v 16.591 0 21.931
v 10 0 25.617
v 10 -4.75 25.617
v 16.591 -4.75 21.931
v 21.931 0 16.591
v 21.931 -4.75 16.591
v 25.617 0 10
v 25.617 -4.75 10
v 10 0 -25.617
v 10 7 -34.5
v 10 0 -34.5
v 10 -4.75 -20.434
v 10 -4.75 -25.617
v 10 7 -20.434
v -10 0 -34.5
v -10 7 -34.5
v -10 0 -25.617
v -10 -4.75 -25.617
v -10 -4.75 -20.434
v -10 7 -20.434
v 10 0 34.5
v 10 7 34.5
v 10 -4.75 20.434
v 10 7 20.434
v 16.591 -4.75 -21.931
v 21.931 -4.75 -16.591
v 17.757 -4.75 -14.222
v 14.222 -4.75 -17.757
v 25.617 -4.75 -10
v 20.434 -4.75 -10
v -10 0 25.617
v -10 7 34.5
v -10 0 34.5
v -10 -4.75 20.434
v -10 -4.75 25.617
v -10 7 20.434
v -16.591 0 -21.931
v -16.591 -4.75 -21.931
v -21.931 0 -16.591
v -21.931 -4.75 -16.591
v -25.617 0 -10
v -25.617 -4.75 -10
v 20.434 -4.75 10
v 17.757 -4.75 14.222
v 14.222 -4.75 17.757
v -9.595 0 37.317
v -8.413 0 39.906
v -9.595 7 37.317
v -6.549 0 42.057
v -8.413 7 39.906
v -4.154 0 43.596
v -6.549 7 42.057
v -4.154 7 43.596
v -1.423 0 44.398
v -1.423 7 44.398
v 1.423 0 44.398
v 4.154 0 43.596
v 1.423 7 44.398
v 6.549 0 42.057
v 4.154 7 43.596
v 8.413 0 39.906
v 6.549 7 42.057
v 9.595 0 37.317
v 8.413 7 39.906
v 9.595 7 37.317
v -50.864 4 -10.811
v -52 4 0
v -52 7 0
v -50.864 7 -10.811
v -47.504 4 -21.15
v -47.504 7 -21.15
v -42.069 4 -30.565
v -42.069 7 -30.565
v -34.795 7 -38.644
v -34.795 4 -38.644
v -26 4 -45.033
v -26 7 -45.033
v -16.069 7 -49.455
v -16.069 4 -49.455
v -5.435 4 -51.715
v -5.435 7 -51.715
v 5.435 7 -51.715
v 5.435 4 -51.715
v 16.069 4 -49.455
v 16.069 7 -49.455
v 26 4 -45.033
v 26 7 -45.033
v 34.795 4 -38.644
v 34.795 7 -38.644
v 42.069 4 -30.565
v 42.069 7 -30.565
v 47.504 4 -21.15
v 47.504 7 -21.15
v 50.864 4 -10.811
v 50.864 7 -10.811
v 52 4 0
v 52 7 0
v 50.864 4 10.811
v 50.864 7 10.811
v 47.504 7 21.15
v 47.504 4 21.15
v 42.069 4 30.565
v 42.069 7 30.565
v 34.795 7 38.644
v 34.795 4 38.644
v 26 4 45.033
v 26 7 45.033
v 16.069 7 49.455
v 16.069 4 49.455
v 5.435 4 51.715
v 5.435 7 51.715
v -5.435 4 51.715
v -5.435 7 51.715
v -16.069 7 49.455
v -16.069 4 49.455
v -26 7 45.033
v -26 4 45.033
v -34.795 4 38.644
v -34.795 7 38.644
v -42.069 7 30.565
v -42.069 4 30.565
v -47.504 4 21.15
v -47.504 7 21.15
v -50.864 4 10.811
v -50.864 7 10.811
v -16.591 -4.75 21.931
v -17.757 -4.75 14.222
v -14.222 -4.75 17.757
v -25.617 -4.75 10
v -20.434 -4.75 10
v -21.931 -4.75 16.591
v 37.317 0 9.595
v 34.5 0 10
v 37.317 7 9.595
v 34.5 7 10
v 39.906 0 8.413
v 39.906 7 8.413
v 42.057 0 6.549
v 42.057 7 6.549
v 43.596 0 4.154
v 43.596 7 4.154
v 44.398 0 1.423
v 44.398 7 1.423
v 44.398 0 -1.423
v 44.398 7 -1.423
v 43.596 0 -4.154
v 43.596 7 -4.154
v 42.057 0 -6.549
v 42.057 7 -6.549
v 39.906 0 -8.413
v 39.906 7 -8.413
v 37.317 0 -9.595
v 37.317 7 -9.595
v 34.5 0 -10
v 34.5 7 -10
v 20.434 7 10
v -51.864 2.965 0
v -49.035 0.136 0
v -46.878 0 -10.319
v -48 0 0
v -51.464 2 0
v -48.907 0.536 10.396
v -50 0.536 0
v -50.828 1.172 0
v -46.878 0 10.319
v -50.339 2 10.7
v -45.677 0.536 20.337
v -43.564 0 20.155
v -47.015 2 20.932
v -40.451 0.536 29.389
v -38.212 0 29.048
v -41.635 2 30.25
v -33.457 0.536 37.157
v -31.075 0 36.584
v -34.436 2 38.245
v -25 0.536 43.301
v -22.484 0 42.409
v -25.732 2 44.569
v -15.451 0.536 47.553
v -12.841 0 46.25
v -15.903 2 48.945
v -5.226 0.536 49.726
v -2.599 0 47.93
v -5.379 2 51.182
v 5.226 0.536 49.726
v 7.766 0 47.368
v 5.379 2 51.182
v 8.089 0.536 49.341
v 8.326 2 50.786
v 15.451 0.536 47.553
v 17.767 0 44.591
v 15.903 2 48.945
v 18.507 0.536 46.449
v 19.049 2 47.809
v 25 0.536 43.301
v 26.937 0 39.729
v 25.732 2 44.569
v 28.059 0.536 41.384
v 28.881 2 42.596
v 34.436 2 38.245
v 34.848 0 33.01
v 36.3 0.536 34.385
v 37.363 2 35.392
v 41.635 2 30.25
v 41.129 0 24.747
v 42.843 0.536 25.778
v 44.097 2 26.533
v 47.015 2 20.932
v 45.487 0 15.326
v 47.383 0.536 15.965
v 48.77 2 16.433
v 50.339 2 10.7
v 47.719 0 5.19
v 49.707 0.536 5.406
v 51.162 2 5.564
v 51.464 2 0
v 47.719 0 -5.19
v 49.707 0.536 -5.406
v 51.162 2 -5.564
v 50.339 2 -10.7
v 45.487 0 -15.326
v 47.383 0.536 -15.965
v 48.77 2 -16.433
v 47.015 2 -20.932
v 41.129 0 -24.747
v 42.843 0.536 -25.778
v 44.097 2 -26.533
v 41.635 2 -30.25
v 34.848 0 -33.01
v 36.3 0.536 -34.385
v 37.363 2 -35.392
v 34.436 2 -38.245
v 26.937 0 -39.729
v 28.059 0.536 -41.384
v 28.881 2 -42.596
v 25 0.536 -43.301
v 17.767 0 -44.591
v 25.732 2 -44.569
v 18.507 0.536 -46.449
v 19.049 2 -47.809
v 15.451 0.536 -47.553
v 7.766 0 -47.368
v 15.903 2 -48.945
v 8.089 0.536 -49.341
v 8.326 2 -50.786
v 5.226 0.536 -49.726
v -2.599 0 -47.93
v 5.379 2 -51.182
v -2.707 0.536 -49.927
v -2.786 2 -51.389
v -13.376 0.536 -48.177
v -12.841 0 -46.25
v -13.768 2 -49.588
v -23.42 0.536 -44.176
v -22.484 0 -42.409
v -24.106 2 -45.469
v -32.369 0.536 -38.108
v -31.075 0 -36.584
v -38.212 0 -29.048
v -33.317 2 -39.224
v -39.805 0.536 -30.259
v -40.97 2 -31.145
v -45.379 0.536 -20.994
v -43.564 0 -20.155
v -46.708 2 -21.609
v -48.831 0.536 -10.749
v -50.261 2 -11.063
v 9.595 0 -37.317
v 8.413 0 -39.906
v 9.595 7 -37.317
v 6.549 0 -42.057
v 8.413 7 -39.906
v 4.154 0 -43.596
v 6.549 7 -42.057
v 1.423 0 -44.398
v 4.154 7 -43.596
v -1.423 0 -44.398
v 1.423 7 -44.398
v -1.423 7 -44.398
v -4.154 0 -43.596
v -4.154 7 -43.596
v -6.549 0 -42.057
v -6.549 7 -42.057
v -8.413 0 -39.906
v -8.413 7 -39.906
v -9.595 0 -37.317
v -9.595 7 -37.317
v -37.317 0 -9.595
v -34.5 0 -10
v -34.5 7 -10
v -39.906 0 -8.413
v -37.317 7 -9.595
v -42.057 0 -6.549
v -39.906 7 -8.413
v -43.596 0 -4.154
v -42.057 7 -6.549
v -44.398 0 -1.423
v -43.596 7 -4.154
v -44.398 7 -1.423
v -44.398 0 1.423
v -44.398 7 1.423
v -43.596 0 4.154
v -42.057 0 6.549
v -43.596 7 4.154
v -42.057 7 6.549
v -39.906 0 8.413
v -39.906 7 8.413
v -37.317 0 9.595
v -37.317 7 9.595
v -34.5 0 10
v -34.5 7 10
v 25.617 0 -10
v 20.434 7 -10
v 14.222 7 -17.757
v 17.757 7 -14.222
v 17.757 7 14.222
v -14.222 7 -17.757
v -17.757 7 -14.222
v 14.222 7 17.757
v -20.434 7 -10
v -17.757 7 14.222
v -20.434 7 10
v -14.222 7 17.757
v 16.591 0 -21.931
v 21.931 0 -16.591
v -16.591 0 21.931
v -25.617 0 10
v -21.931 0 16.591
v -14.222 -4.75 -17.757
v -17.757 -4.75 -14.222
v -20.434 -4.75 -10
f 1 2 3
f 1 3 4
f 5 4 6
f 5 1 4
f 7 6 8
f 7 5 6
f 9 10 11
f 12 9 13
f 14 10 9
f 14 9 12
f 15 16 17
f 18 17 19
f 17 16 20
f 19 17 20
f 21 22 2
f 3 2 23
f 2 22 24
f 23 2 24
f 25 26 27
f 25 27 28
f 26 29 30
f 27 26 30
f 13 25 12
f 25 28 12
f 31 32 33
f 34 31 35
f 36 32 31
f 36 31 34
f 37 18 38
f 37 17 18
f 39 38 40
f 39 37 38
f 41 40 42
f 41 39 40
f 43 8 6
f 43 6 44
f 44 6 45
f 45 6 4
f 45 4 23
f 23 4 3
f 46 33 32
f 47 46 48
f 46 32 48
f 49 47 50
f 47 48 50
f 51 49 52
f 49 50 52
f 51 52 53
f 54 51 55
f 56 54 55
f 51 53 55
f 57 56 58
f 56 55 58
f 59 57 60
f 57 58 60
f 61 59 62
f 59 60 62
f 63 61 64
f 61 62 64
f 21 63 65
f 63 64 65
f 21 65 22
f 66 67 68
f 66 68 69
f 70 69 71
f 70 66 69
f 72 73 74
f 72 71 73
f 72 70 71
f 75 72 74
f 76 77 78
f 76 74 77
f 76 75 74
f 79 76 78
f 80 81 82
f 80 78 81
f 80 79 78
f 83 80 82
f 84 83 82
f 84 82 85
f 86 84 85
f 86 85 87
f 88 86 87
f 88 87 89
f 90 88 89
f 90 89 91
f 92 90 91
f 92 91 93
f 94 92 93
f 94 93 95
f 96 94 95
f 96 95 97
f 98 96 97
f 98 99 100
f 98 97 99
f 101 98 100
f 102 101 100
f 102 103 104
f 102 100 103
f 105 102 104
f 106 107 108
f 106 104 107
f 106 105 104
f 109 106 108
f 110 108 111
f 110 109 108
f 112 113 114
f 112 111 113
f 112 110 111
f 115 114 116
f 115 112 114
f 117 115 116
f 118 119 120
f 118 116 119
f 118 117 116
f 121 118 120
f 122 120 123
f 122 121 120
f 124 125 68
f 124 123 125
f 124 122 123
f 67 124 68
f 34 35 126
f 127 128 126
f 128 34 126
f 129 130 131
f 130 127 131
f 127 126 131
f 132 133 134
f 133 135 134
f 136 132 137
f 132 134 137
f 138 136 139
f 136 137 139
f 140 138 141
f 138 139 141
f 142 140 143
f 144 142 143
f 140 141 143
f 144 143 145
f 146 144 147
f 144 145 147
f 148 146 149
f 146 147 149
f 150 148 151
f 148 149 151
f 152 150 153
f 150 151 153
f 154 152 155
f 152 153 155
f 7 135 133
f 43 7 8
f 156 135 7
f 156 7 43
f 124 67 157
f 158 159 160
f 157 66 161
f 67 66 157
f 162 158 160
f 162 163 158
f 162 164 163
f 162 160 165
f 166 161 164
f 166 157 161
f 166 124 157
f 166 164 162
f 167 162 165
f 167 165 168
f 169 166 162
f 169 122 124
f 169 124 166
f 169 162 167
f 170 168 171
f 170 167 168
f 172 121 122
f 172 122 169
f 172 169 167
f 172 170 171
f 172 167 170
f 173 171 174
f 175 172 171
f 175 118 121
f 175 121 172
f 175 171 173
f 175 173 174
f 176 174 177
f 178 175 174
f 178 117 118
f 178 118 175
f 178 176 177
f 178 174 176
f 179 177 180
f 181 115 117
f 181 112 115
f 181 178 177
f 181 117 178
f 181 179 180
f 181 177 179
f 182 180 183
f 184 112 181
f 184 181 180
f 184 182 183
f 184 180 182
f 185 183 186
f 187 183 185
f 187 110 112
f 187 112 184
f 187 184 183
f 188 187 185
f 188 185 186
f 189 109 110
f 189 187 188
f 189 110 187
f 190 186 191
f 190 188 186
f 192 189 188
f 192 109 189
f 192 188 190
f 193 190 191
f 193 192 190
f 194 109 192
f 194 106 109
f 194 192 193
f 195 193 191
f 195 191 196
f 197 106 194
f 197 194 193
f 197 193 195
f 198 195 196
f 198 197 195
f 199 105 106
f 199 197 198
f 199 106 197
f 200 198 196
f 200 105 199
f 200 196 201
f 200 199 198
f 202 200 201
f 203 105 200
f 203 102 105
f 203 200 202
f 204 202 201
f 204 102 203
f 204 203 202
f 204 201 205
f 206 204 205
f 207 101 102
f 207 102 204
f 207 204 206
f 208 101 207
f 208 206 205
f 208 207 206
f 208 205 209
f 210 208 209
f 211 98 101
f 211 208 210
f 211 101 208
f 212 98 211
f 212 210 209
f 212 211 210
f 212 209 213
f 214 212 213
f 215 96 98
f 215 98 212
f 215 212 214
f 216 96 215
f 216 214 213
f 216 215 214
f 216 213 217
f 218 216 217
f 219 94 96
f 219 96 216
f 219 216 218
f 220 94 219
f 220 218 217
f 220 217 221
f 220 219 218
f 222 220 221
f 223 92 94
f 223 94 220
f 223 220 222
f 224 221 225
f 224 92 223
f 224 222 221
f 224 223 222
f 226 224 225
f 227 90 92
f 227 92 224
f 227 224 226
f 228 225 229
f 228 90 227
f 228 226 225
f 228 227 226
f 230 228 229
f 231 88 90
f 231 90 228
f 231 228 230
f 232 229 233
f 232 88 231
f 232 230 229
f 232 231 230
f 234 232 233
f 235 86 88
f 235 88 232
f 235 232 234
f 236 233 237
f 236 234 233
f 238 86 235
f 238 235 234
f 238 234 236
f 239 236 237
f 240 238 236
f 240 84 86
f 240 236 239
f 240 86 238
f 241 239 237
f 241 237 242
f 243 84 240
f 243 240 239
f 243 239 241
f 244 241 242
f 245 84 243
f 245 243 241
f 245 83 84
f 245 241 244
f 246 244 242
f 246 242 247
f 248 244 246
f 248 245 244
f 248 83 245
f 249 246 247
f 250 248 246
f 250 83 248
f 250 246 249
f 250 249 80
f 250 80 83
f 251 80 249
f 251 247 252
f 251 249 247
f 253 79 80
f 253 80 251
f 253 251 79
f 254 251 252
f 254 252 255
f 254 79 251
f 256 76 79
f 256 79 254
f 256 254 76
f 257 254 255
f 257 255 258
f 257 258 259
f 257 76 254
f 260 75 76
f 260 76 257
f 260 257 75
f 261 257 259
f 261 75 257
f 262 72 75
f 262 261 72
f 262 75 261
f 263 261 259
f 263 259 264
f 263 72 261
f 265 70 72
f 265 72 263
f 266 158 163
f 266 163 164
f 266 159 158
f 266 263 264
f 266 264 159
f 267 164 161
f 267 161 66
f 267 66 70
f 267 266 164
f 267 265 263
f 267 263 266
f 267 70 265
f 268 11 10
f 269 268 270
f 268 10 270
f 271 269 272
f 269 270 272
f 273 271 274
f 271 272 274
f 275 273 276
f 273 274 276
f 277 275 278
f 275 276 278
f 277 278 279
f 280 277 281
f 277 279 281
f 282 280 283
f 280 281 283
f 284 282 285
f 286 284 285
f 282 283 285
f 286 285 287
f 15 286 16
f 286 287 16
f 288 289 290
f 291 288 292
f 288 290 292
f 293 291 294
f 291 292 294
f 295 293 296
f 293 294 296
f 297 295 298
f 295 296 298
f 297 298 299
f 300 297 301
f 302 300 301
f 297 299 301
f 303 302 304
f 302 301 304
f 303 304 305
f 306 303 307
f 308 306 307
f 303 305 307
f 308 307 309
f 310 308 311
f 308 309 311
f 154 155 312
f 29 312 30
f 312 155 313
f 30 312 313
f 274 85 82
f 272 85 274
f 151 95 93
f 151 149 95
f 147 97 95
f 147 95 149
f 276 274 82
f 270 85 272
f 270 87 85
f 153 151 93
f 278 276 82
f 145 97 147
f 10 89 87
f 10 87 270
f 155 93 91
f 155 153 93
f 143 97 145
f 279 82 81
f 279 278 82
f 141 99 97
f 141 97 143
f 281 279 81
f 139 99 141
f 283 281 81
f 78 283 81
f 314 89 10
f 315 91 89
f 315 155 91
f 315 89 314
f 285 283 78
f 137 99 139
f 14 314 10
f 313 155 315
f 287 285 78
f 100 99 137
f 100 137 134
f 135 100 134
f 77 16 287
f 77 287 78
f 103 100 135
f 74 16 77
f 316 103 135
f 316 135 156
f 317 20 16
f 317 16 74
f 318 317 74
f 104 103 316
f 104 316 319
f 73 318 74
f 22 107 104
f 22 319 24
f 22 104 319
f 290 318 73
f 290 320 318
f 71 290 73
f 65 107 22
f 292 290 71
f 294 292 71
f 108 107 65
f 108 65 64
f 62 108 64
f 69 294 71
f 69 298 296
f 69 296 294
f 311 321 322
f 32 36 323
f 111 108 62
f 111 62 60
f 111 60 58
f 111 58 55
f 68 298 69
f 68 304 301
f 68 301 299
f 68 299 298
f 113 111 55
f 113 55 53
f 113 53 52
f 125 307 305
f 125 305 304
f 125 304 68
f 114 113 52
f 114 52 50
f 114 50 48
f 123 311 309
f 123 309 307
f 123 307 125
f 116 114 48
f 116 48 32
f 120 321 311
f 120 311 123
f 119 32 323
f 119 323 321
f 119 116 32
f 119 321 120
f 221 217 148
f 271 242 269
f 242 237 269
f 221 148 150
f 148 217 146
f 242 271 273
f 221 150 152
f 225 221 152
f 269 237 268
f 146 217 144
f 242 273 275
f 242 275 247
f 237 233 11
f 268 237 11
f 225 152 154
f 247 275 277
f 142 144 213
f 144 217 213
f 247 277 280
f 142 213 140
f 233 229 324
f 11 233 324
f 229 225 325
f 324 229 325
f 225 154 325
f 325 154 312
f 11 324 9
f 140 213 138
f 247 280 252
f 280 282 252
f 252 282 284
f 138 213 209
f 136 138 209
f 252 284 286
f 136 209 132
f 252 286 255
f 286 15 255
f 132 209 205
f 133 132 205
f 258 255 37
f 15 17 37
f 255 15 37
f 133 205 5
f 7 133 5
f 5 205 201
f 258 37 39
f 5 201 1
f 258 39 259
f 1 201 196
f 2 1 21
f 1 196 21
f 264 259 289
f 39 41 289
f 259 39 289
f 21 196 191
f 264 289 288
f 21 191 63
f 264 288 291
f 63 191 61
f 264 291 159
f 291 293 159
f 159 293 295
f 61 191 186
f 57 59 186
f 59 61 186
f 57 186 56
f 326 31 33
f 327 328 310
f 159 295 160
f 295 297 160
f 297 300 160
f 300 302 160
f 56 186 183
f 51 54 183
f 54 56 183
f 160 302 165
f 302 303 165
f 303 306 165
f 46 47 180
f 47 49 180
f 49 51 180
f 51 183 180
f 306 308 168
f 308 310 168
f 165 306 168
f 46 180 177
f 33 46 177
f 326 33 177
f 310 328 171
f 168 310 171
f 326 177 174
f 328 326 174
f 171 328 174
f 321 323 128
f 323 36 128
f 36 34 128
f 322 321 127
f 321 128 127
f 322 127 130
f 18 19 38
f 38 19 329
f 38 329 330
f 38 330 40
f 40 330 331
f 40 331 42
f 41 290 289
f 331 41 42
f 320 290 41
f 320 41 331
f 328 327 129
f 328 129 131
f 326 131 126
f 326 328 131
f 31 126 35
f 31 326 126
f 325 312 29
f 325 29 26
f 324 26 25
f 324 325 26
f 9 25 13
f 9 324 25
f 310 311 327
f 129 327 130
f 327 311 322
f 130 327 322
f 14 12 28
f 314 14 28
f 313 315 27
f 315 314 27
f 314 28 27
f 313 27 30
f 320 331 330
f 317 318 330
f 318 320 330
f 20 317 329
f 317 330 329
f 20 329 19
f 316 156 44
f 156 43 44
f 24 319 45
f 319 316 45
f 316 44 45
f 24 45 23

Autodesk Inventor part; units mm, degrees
ref_plane "YZ Plane" through (0, 0, 0) normal (1, 0, 0) x (0, 1, 0)
ref_plane "XZ Plane" through (0, 0, 0) normal (0, 1, 0) x (-1, 0, 0)
ref_plane "XY Plane" through (0, 0, 0) normal (0, 0, 1) x (1, 0, 0)
sketch "Sketch1" plane through (0, 0, 0) normal (0, 1, 0) x (-1, 0, 0)
  circle A0 centre (0, 0) radius 52
  circle A1 centre (0, 0) radius 22.75
  circle A2 centre (0, 0) radius 27.5
  dimension "d2" = 45.5
  dimension "d4" = 55
extrude "Extrusion1" add sketch "Sketch1" against normal blind 4.75 contours A2
extrude "Extrusion2" add sketch "Sketch1" along normal blind 7 contours A0 | A2
fillet "Fillet1" radius 4 1 edges at (52, 0, 0)
sketch "Sketch2" plane through (0, 7, 0) normal (0, 1, 0) x (1, 0, 0)
  circle A0 centre (34.5, 0) radius 10
  circle A1 centre (0, 34.5) radius 10
  circle A2 centre (-34.5, 0) radius 10
  circle A3 centre (0, -34.5) radius 10
  circle A4 centre (0, 0) radius 52
  line L0 (0, 0) -> (44.5, 0)
  circle A5 centre (0, 0) radius 44.5
  dimension "d14" = 360
extrude "Extrusion3" cut sketch "Sketch2" against normal through all contours L0 A0 | A0 L0 | A1 | A2 | A3
sketch "Sketch3" plane through (0, 7, 0) normal (0, 1, 0) x (1, 0, 0)
  circle A0 centre (0, 34.5) radius 10 projected
  arc A1 (6.3329, 26.7609) -> (-6.3329, 26.7609) centre (0, 34.5) ccw projected
  line L0 (-10, 34.5) -> (-10, 20.4343)
  circle A2 centre (0, 0) radius 22.75 projected
  line L1 (10, 34.5) -> (10, 20.4343)
  line L2 (-34.5, -10) -> (-20.4343, -10)
  line L3 (-34.5, 10) -> (-20.4343, 10)
  line L4 (10, -34.5) -> (10, -20.4343)
  line L5 (-10, -34.5) -> (-10, -20.4343)
  line L6 (34.5, 10) -> (20.4343, 10)
  line L7 (34.5, -10) -> (20.4343, -10)
  circle A3 centre (-34.5, 0) radius 10 projected
  circle A4 centre (34.5, 0) radius 10 projected
  circle A5 centre (0, -34.5) radius 10 projected
  point P0 (-26.7609, 6.3329)
  point P1 (-26.7609, -6.3329)
  point P2 (-6.3329, -26.7609)
  point P3 (6.3329, -26.7609)
  point P4 (34.5, 0)
  point P5 (26.7609, -6.3329)
  point P6 (26.7609, 6.3329)
  point P7 (34.5, 0)
  dimension "d22" = 360
extrude "Extrusion5" cut sketch "Sketch3" against normal through all contours L1 A2 L0 A0 | L6 A4 L7 A2 | A2 L2 A3 L3 | A2 L4 A5 L5
properties part number "wheel_chain_guide_holes"
